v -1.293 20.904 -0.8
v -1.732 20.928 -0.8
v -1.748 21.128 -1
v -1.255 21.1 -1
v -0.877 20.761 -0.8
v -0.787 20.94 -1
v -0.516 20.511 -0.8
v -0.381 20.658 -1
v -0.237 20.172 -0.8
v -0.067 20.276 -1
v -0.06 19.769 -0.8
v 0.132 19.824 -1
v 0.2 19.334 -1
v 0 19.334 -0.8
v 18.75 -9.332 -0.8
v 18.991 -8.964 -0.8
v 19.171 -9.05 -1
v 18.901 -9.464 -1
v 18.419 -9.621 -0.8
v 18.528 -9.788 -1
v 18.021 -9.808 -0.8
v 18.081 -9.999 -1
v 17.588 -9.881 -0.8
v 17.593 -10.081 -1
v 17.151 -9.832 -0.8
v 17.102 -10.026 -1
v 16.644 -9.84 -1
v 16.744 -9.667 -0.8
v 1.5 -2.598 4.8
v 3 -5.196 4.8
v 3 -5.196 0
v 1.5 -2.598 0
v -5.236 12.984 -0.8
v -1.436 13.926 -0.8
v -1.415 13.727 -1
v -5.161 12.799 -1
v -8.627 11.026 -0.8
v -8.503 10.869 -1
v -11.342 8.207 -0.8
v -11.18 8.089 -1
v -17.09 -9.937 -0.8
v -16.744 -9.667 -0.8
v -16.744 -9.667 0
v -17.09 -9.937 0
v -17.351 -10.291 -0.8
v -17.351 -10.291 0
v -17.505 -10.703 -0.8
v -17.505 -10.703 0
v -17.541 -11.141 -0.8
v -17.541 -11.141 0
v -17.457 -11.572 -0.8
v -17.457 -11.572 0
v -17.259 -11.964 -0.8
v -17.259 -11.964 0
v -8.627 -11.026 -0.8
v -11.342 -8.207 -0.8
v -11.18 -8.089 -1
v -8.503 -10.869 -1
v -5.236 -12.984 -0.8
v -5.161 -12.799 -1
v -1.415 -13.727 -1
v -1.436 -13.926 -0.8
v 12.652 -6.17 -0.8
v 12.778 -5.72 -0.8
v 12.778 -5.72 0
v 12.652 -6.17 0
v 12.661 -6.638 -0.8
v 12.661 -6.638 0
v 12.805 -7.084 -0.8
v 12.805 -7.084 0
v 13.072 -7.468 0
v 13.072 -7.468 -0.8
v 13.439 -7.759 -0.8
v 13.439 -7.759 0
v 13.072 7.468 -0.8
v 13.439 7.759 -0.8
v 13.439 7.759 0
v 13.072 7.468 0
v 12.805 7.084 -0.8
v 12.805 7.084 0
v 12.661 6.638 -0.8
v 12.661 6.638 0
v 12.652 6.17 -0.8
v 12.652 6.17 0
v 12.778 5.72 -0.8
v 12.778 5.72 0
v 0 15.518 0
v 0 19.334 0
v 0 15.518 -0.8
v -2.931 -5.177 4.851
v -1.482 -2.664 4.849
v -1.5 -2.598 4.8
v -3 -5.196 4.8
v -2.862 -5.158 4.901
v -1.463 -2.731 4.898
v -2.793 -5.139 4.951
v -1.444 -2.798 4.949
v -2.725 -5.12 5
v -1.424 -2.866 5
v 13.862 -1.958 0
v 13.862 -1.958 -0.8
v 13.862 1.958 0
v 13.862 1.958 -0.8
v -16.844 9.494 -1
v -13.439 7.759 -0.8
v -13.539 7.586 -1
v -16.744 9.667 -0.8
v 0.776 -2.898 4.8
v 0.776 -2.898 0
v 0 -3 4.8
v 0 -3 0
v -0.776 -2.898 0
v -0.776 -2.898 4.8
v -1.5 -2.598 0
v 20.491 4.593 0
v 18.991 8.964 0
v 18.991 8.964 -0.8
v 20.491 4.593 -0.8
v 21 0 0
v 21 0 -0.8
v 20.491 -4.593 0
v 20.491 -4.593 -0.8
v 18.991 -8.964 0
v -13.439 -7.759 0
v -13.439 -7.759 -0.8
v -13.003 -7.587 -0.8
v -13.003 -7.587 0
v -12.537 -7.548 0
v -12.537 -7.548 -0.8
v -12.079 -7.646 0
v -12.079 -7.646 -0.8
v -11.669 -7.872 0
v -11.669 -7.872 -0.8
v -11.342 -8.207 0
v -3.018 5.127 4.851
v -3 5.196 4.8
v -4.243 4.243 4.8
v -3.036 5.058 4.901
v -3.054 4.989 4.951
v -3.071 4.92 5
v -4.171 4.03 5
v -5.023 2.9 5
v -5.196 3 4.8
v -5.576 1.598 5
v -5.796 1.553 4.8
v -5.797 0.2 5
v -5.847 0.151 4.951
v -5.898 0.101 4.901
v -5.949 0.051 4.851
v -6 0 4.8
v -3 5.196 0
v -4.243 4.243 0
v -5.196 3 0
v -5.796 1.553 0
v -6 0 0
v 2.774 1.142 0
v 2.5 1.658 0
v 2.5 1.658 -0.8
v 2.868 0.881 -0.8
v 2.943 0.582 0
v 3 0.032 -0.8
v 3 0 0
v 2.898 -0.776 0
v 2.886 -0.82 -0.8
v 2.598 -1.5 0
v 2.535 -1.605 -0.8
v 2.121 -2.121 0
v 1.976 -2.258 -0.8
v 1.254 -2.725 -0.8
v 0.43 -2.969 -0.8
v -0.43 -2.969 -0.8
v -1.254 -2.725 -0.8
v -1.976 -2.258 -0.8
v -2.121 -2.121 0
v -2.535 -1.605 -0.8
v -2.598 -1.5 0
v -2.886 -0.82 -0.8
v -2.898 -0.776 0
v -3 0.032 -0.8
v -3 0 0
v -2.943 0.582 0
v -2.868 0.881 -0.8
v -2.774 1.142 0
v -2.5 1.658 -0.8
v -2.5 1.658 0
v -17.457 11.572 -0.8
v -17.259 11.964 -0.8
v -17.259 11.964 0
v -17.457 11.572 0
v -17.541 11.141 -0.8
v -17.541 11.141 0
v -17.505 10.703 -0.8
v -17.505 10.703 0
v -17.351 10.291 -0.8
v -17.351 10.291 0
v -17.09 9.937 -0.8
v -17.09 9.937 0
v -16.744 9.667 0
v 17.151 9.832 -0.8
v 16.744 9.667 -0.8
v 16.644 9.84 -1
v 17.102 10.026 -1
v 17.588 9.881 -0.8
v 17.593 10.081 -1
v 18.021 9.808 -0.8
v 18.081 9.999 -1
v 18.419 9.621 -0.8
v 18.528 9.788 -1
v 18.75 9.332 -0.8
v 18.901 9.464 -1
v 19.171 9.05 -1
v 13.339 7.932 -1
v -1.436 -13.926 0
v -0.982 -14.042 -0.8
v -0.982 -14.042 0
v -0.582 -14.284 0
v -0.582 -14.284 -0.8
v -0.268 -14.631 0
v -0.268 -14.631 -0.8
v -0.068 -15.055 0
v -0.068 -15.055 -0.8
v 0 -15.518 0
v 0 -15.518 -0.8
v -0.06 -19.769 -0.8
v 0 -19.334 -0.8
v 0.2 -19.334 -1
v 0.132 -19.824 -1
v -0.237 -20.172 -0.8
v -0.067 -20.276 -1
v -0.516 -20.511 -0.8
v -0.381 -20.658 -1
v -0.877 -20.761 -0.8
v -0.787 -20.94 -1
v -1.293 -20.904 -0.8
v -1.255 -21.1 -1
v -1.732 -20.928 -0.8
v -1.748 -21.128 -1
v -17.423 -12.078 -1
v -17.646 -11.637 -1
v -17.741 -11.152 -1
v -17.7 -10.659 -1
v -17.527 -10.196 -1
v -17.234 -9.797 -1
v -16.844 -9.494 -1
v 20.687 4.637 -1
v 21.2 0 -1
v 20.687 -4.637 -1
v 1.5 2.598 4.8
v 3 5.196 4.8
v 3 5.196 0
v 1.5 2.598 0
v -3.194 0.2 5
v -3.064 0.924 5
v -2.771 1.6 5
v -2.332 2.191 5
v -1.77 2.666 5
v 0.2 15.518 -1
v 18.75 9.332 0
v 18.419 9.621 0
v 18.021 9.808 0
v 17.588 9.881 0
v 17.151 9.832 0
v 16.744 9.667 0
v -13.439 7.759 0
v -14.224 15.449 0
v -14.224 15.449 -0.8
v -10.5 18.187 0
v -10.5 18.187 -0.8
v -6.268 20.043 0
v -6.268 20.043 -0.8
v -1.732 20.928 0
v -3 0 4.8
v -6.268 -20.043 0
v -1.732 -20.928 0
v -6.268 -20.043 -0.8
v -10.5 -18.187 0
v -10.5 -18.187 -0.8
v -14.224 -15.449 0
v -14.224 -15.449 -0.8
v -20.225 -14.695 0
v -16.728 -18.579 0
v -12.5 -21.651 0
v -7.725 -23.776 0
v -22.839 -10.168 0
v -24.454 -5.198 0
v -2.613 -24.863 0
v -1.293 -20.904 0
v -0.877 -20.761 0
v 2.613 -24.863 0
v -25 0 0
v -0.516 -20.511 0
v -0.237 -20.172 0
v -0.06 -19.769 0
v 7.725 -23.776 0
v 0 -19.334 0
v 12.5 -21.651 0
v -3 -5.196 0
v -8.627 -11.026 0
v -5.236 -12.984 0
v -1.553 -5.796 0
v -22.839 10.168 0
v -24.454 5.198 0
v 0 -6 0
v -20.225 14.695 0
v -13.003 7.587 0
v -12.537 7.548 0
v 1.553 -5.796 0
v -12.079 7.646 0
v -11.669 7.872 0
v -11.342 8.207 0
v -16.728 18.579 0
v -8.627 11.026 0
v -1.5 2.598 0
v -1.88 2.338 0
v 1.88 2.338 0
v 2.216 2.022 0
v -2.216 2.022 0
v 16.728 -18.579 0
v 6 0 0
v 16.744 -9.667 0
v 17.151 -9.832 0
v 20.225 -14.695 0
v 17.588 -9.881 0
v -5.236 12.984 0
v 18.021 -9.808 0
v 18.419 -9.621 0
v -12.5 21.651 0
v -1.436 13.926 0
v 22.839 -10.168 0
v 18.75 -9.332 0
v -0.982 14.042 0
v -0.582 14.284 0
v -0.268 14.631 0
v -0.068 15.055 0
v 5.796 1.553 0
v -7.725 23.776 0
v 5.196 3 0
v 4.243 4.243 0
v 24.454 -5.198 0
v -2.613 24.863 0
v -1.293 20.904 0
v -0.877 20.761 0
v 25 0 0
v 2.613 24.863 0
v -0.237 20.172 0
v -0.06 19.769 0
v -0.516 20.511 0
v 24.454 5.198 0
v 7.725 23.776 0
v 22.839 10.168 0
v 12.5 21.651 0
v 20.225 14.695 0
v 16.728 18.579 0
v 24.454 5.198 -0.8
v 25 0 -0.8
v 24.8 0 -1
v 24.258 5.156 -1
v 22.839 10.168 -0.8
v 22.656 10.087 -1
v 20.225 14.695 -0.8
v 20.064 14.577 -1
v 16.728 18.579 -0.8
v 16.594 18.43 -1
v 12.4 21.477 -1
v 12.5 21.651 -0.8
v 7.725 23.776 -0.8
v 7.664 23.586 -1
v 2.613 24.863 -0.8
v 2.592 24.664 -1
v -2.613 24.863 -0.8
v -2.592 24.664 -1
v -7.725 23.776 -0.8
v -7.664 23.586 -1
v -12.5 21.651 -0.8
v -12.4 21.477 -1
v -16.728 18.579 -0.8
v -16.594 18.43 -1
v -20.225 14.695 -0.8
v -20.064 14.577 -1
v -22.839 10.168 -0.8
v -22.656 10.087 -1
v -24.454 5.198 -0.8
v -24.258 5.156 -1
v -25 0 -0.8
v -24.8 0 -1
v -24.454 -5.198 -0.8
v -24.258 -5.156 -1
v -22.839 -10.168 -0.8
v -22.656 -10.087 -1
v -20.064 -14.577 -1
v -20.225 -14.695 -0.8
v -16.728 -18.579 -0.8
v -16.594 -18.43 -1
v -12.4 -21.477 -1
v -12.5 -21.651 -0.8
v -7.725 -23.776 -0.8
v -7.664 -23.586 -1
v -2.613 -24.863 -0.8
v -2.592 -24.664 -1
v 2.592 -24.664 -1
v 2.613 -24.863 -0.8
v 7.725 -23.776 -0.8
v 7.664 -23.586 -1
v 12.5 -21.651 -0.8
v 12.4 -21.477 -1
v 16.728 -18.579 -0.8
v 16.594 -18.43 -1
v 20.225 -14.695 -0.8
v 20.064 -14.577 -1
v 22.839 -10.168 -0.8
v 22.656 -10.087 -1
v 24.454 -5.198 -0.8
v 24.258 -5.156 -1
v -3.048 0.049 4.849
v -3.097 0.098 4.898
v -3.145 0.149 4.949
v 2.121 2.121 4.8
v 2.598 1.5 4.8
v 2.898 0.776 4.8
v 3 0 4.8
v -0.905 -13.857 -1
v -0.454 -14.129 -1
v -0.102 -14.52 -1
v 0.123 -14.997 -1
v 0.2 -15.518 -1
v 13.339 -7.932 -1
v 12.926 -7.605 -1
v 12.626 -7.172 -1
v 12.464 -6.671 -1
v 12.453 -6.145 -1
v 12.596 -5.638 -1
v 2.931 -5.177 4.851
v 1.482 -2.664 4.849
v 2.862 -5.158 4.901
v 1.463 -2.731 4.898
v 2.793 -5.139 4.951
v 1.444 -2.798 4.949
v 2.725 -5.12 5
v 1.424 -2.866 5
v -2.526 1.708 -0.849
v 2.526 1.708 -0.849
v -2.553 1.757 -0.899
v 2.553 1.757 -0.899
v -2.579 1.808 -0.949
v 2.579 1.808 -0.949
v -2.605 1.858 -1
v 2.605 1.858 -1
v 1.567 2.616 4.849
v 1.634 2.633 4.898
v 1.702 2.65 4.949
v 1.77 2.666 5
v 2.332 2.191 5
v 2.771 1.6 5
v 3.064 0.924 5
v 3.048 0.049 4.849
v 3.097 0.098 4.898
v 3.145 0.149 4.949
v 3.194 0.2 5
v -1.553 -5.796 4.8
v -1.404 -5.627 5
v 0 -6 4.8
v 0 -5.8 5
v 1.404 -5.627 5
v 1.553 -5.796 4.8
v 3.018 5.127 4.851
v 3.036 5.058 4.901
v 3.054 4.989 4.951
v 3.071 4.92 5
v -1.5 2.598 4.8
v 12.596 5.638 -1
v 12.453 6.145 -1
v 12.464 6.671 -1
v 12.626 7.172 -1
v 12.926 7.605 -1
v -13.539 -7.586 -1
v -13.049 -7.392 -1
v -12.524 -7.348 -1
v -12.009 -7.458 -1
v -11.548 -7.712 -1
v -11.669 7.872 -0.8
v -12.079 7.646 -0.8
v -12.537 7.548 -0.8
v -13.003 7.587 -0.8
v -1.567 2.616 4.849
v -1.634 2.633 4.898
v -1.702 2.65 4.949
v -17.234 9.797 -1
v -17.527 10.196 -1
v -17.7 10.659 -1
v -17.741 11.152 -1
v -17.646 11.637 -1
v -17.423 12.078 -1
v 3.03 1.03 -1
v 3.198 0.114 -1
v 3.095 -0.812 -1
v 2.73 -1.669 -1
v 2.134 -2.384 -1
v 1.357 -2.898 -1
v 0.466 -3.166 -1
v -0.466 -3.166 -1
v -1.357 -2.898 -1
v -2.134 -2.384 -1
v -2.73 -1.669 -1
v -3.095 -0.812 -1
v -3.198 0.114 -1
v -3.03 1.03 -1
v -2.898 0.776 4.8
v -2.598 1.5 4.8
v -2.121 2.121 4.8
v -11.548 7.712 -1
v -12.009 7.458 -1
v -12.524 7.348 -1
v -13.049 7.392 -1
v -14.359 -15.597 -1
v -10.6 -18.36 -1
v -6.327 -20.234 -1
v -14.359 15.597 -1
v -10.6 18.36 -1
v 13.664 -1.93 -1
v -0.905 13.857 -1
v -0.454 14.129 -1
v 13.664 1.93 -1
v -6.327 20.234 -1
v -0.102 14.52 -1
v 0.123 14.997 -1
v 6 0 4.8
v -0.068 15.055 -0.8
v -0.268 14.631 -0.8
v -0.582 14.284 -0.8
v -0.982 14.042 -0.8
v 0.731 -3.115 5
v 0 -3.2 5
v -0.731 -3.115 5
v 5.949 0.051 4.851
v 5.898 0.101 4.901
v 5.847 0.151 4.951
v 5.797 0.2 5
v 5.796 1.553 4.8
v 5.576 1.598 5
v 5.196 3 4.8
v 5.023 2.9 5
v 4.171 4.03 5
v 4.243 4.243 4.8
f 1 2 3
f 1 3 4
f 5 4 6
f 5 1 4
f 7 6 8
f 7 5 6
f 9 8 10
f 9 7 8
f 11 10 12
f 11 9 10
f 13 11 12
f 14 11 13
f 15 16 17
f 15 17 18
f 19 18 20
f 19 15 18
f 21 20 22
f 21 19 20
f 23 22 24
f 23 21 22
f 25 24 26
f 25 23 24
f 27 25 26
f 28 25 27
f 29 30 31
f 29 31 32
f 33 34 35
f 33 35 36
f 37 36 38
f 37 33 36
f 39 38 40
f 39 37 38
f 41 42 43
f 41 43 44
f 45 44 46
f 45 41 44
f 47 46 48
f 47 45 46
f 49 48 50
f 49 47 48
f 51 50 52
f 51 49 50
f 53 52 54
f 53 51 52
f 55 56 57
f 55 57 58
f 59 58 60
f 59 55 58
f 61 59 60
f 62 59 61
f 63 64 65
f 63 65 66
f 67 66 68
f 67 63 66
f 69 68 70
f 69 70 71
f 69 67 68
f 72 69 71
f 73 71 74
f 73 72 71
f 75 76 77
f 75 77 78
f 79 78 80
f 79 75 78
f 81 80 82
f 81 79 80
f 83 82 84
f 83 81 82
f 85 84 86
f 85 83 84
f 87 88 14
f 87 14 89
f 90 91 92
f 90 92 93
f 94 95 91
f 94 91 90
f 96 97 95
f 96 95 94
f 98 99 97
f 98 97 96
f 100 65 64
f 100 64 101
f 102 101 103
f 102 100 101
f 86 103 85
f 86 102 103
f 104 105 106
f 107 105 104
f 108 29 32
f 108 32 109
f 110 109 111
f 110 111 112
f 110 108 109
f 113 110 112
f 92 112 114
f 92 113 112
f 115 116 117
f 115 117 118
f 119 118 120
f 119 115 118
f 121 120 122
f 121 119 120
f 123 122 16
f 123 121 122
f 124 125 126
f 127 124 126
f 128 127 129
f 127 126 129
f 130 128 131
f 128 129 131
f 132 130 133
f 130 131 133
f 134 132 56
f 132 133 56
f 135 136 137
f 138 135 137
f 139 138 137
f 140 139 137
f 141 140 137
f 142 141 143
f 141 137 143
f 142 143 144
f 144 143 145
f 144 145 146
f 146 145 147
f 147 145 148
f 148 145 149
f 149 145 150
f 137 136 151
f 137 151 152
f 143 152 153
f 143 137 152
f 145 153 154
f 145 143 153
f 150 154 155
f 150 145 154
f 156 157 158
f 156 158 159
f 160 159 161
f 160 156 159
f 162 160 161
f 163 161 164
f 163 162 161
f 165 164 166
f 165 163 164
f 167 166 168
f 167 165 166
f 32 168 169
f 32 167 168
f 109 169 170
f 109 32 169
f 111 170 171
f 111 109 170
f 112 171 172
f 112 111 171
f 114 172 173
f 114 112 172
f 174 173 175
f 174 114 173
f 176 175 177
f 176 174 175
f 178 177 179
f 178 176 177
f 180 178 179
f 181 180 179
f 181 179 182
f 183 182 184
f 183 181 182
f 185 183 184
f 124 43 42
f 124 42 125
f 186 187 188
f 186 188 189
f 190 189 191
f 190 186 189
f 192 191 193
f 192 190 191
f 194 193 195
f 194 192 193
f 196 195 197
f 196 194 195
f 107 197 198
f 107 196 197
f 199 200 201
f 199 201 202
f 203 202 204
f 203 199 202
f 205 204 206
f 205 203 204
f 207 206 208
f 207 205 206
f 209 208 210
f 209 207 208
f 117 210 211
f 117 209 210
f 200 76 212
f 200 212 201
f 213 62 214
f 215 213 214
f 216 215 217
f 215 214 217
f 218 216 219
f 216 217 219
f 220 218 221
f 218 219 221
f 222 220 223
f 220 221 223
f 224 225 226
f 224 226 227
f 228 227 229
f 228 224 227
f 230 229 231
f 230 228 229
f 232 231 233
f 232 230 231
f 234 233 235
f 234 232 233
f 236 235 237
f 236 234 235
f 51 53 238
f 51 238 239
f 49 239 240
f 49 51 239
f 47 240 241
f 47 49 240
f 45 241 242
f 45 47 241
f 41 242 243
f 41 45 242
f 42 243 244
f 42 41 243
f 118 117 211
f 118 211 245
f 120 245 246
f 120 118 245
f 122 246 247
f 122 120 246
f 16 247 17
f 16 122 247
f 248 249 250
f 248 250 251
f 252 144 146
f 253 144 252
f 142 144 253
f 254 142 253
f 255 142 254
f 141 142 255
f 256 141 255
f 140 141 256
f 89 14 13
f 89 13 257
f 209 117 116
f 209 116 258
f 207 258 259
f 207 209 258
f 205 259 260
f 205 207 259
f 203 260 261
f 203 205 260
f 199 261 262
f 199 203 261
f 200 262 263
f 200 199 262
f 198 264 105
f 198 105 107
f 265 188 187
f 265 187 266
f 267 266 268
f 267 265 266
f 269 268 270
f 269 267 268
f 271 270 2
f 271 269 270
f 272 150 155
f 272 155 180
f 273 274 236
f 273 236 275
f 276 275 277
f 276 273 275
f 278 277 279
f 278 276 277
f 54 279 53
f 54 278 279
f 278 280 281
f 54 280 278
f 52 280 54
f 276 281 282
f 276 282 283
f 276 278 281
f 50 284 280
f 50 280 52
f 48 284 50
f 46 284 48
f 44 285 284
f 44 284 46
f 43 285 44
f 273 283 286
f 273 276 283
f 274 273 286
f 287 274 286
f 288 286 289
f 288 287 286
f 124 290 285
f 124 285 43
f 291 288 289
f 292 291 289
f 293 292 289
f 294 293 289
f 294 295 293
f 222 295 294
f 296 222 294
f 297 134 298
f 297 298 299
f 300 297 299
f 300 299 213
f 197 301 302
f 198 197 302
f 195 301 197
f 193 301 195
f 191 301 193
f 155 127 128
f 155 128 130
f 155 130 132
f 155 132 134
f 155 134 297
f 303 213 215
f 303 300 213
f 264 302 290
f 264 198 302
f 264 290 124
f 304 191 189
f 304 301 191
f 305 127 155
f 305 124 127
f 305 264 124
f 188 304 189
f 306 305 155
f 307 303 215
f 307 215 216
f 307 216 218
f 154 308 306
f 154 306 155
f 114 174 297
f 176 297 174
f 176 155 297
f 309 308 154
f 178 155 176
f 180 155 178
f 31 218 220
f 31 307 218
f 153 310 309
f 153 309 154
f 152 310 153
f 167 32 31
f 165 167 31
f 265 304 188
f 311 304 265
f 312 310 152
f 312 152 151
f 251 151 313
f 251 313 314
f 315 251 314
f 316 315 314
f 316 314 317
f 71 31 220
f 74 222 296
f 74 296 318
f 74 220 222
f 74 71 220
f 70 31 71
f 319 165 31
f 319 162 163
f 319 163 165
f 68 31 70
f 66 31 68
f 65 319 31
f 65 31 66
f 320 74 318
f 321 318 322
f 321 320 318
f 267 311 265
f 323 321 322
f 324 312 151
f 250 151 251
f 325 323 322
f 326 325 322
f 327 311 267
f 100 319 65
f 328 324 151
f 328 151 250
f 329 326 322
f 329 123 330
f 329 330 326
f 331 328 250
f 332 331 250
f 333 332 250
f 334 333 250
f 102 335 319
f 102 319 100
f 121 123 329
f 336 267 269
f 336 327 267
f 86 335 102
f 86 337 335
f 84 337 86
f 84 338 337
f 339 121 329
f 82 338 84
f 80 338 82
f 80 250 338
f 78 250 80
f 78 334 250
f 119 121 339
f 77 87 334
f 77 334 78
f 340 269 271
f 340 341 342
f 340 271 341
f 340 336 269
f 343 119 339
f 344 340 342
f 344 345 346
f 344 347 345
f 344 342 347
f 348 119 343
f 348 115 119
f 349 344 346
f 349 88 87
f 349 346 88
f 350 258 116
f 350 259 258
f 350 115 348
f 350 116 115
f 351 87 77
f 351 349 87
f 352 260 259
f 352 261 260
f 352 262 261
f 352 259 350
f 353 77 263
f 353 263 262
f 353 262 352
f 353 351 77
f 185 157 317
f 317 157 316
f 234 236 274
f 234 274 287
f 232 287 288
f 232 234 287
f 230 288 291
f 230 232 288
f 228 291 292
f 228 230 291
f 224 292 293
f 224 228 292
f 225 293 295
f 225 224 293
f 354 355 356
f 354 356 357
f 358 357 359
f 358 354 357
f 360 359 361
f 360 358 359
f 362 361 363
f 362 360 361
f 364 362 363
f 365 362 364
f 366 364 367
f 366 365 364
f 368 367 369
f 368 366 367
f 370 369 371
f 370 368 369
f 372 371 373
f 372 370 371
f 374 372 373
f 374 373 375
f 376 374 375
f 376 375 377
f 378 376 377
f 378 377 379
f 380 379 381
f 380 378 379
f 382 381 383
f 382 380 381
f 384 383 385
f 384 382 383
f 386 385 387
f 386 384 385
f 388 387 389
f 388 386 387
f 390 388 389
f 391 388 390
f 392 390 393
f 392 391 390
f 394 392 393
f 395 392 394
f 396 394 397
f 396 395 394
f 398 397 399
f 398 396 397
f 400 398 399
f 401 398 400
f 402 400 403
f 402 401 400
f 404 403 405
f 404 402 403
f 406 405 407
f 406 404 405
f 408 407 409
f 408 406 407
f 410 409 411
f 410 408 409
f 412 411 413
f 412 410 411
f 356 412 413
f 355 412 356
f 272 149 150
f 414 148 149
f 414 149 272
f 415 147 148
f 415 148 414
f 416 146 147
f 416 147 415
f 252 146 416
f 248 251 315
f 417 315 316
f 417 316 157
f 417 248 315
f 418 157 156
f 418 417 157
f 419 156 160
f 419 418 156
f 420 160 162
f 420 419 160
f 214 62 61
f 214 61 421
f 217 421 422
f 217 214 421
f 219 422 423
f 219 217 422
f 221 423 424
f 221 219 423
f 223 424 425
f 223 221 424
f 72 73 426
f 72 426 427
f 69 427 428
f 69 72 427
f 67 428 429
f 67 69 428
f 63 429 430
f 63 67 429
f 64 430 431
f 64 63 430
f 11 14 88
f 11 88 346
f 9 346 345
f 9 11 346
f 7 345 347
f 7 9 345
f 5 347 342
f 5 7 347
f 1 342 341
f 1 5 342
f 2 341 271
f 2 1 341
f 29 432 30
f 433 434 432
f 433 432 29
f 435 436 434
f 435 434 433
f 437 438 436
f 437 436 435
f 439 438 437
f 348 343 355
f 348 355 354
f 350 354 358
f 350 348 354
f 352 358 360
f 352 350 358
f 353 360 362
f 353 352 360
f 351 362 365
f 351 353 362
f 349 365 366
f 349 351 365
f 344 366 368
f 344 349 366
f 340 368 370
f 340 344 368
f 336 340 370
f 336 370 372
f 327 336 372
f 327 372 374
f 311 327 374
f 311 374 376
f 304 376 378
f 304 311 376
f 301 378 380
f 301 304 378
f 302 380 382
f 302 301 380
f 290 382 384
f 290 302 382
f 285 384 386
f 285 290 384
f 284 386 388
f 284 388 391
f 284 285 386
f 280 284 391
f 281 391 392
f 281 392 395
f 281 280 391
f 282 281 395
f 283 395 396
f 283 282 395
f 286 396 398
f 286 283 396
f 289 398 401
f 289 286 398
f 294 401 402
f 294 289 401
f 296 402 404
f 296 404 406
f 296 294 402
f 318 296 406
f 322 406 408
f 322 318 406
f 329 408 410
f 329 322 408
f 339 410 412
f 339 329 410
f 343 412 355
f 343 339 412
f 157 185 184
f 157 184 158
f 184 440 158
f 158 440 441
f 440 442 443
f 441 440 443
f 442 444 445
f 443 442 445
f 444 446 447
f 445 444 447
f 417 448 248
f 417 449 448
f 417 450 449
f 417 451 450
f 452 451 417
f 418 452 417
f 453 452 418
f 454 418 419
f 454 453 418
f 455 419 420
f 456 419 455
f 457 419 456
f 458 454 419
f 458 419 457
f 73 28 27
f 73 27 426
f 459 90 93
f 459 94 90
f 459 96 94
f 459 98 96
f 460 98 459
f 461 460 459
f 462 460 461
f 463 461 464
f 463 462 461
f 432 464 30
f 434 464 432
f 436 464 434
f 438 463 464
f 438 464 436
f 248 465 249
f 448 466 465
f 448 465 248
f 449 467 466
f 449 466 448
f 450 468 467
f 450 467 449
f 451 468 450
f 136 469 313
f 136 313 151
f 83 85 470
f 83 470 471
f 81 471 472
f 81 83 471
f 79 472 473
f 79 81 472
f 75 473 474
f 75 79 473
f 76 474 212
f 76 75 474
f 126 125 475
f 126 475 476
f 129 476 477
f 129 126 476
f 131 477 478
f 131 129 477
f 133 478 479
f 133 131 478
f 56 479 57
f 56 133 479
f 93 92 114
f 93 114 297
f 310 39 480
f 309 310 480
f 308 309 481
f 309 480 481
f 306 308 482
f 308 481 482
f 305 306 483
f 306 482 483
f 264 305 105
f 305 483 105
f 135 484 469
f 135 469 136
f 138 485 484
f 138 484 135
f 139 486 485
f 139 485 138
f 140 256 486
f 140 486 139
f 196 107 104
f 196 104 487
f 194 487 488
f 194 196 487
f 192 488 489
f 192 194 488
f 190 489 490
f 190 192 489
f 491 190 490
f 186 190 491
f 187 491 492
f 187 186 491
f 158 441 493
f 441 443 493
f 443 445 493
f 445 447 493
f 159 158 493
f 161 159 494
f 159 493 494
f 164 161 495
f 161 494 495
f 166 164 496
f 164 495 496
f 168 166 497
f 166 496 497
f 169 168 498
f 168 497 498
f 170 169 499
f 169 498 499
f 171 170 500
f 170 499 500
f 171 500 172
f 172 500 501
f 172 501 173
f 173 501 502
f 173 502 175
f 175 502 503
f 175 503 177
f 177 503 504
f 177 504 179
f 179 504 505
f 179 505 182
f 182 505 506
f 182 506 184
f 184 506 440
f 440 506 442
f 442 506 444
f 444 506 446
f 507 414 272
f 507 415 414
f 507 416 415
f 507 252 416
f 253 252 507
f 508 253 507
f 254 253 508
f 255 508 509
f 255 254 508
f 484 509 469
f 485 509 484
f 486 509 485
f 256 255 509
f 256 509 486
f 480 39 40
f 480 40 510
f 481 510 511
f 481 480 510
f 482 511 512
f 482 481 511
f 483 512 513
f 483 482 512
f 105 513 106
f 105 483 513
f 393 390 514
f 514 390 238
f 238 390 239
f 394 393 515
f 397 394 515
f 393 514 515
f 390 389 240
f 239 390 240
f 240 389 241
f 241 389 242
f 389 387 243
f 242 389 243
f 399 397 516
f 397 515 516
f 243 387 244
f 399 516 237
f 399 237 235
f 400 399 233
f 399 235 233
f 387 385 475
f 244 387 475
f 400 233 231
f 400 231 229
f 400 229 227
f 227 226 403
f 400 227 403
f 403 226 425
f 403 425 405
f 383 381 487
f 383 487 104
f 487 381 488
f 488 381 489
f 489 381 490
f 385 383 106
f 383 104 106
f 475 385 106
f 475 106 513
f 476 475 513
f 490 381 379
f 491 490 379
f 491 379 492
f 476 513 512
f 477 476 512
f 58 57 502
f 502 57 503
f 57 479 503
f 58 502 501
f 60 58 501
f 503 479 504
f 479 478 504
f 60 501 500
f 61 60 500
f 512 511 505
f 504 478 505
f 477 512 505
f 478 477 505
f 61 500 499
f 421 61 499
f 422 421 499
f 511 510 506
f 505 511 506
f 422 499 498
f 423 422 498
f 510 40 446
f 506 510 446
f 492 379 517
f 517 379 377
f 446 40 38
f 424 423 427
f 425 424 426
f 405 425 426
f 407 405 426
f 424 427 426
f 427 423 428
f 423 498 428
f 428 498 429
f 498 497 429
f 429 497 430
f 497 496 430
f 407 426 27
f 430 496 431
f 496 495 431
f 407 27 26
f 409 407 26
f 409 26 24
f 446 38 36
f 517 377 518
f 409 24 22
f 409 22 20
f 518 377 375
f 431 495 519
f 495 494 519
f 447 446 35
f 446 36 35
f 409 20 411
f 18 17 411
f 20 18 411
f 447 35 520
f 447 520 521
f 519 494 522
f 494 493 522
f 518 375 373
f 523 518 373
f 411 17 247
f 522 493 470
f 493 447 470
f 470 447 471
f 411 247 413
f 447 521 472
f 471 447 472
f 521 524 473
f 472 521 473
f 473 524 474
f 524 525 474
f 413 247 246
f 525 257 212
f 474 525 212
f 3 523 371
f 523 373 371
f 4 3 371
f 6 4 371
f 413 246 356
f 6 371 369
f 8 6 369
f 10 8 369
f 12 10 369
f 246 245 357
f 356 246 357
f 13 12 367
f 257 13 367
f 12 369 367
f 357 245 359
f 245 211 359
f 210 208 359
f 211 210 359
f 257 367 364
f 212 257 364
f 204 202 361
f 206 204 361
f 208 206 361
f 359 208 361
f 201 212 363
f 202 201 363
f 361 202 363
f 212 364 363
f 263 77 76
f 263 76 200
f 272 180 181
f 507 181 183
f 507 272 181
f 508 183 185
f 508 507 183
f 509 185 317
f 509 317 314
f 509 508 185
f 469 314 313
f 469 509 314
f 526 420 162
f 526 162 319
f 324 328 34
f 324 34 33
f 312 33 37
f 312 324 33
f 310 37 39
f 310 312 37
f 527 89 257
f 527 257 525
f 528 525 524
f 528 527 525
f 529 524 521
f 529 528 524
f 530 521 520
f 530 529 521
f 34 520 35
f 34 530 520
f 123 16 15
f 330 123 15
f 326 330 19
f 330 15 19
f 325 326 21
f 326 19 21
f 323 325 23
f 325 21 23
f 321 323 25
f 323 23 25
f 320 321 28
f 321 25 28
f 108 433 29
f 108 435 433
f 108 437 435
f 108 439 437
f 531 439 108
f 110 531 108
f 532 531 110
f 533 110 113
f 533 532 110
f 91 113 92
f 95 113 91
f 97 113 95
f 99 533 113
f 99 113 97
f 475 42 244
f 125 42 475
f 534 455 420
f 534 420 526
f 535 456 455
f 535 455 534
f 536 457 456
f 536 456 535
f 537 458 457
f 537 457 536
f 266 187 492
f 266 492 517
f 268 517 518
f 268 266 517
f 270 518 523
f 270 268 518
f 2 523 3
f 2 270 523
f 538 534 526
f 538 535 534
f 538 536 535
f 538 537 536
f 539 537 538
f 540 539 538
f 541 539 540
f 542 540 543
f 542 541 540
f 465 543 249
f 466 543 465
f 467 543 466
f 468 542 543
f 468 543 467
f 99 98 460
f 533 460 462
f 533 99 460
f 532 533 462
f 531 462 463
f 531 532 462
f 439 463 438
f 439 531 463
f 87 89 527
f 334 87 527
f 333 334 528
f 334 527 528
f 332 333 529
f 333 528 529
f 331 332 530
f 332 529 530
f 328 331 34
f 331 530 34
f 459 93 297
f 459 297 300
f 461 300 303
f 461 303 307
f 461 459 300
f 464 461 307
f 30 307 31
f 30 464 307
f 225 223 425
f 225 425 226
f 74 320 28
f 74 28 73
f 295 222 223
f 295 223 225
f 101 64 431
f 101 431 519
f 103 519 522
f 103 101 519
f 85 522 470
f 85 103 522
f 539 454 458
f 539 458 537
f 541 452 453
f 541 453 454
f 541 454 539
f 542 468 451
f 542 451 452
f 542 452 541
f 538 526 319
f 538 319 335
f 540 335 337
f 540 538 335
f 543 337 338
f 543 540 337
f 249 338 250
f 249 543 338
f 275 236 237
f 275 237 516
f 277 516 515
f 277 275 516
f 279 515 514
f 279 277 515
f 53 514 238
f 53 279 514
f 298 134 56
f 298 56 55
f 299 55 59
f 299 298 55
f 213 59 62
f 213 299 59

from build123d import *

# Parameters (mm, degrees)
SKETCH_1_R      = 25
EXTRUDE_1_DEPTH = 1
FILLET_1_R      = 1.6
EXTRUDE_START   = 5
EXTRUDE_3_DEPTH = 5
CHAMFER_3_SIZE  = 0.2


with BuildPart() as part:
    # 草图1 → 凸台-拉伸1 (new body)
    with BuildSketch(Plane.XY):
        Circle(SKETCH_1_R)
        with BuildLine():
            Line((-2.5, 1.658312395), (2.5, 1.658312395))
            ThreePointArc((2.5, 1.658312395), (0, -3), (-2.5, 1.658312395))
        make_face(mode=Mode.SUBTRACT)
        with BuildLine():
            ThreePointArc((-12.124355653, -7), (-7, -12.124355653), (0, -14))
            Line((0, -14), (0, -21))
            ThreePointArc((0, -21), (-10.5, -18.186533479), (-18.186533479, -10.5))
            Line((-18.186533479, -10.5), (-12.124355653, -7))
        make_face(mode=Mode.SUBTRACT)
        with BuildLine():
            ThreePointArc((0, 14), (-7, 12.124355653), (-12.124355653, 7))
            Line((-12.124355653, 7), (-18.186533479, 10.5))
            ThreePointArc((-18.186533479, 10.5), (-10.5, 18.186533479), (0, 21))
            Line((0, 21), (0, 14))
        make_face(mode=Mode.SUBTRACT)
        with BuildLine():
            Line((18.186533479, -10.5), (12.124355653, -7))
            ThreePointArc((12.124355653, -7), (14, 0), (12.124355653, 7))
            Line((12.124355653, 7), (18.186533479, 10.5))
            ThreePointArc((18.186533479, 10.5), (21, 0), (18.186533479, -10.5))
        make_face(mode=Mode.SUBTRACT)
    extrude(amount=-EXTRUDE_1_DEPTH)

    # 圆角1
    fillet_1_edges = [part.edges().sort_by_distance(p)[0] for p in [
        (-18.186533479, -10.5, -0.5),
        (0, -21, -0.5),
        (0, -14, -0.5),
        (-12.124355653, -7, -0.5),
        (18.186533479, -10.5, -0.5),
        (18.186533479, 10.5, -0.5),
        (12.124355653, 7, -0.5),
        (12.124355653, -7, -0.5),
        (-18.186533479, 10.5, -0.5),
        (-12.124355653, 7, -0.5),
        (0, 14, -0.5),
        (0, 21, -0.5),
    ]]
    fillet(fillet_1_edges, radius=FILLET_1_R)

    # 草图1<5> → 凸台-拉伸3 (add)
    with BuildSketch(Plane.XY.offset(EXTRUDE_START)):
        with BuildLine():
            ThreePointArc((-3, 0), (-2.598076211, 1.5), (-1.5, 2.598076211))
            Line((-1.5, 2.598076211), (-3, 5.196152423))
            ThreePointArc((-3, 5.196152423), (-5.196152423, 3), (-6, 0))
            Line((-6, 0), (-3, 0))
        make_face()
        with BuildLine():
            ThreePointArc((1.5, 2.598076211), (2.598076211, 1.5), (3, 0))
            Line((3, 0), (6, 0))
            ThreePointArc((6, 0), (5.196152423, 3), (3, 5.196152423))
            Line((3, 5.196152423), (1.5, 2.598076211))
        make_face()
        with BuildLine():
            ThreePointArc((1.5, -2.598076211), (0, -3), (-1.5, -2.598076211))
            Line((-1.5, -2.598076211), (-3, -5.196152423))
            ThreePointArc((-3, -5.196152423), (0, -6), (3, -5.196152423))
            Line((3, -5.196152423), (1.5, -2.598076211))
        make_face()
    extrude(amount=-EXTRUDE_3_DEPTH)

    # 倒角3
    chamfer_3_edges = [part.edges().sort_by_distance(p)[0] for p in [
        (-0.412026073, 14.44594919, -1),
        (-0.516287404, 20.511009142, -1),
        (0, 1.658312395, -1),
        (-4.5, 0, 5),
        (-2.598076211, 1.5, 5),
        (-2.25, 3.897114317, 5),
        (-5.196152423, 3, 5),
        (2.25, 3.897114317, 5),
        (2.598076211, 1.5, 5),
        (4.5, 0, 5),
        (5.196152423, 3, 5),
        (2.25, -3.897114317, 5),
        (0, -3, 5),
        (-2.25, -3.897114317, 5),
        (0, -6, 5),
        (-25, 0, -1),
        (-10.5, -18.186533479, -1),
        (-15.091202728, -8.712909958, -1),
        (-7, -12.124355653, -1),
        (0, -17.425819915, -1),
        (21, 0, -1),
        (15.091202728, -8.712909958, -1),
        (15.091202728, 8.712909958, -1),
        (14, 0, -1),
        (-15.091202728, 8.712909958, -1),
        (-10.5, 18.186533479, -1),
        (-7, 12.124355653, -1),
        (0, 17.425819915, -1),
        (-17.504911272, -10.702622579, -1),
        (0, -3, -1),
        (-12.304545944, -7.579799641, -1),
        (-0.412026073, -14.44594919, -1),
        (-0.516287404, -20.511009142, -1),
        (18.021198676, -9.808386563, -1),
        (18.021198676, 9.808386563, -1),
        (12.716572017, 6.866149549, -1),
        (12.716572017, -6.866149549, -1),
        (-17.504911272, 10.702622579, -1),
        (-12.304545944, 7.579799641, -1),
    ]]
    chamfer(chamfer_3_edges, length=CHAMFER_3_SIZE)


solid = part.part
